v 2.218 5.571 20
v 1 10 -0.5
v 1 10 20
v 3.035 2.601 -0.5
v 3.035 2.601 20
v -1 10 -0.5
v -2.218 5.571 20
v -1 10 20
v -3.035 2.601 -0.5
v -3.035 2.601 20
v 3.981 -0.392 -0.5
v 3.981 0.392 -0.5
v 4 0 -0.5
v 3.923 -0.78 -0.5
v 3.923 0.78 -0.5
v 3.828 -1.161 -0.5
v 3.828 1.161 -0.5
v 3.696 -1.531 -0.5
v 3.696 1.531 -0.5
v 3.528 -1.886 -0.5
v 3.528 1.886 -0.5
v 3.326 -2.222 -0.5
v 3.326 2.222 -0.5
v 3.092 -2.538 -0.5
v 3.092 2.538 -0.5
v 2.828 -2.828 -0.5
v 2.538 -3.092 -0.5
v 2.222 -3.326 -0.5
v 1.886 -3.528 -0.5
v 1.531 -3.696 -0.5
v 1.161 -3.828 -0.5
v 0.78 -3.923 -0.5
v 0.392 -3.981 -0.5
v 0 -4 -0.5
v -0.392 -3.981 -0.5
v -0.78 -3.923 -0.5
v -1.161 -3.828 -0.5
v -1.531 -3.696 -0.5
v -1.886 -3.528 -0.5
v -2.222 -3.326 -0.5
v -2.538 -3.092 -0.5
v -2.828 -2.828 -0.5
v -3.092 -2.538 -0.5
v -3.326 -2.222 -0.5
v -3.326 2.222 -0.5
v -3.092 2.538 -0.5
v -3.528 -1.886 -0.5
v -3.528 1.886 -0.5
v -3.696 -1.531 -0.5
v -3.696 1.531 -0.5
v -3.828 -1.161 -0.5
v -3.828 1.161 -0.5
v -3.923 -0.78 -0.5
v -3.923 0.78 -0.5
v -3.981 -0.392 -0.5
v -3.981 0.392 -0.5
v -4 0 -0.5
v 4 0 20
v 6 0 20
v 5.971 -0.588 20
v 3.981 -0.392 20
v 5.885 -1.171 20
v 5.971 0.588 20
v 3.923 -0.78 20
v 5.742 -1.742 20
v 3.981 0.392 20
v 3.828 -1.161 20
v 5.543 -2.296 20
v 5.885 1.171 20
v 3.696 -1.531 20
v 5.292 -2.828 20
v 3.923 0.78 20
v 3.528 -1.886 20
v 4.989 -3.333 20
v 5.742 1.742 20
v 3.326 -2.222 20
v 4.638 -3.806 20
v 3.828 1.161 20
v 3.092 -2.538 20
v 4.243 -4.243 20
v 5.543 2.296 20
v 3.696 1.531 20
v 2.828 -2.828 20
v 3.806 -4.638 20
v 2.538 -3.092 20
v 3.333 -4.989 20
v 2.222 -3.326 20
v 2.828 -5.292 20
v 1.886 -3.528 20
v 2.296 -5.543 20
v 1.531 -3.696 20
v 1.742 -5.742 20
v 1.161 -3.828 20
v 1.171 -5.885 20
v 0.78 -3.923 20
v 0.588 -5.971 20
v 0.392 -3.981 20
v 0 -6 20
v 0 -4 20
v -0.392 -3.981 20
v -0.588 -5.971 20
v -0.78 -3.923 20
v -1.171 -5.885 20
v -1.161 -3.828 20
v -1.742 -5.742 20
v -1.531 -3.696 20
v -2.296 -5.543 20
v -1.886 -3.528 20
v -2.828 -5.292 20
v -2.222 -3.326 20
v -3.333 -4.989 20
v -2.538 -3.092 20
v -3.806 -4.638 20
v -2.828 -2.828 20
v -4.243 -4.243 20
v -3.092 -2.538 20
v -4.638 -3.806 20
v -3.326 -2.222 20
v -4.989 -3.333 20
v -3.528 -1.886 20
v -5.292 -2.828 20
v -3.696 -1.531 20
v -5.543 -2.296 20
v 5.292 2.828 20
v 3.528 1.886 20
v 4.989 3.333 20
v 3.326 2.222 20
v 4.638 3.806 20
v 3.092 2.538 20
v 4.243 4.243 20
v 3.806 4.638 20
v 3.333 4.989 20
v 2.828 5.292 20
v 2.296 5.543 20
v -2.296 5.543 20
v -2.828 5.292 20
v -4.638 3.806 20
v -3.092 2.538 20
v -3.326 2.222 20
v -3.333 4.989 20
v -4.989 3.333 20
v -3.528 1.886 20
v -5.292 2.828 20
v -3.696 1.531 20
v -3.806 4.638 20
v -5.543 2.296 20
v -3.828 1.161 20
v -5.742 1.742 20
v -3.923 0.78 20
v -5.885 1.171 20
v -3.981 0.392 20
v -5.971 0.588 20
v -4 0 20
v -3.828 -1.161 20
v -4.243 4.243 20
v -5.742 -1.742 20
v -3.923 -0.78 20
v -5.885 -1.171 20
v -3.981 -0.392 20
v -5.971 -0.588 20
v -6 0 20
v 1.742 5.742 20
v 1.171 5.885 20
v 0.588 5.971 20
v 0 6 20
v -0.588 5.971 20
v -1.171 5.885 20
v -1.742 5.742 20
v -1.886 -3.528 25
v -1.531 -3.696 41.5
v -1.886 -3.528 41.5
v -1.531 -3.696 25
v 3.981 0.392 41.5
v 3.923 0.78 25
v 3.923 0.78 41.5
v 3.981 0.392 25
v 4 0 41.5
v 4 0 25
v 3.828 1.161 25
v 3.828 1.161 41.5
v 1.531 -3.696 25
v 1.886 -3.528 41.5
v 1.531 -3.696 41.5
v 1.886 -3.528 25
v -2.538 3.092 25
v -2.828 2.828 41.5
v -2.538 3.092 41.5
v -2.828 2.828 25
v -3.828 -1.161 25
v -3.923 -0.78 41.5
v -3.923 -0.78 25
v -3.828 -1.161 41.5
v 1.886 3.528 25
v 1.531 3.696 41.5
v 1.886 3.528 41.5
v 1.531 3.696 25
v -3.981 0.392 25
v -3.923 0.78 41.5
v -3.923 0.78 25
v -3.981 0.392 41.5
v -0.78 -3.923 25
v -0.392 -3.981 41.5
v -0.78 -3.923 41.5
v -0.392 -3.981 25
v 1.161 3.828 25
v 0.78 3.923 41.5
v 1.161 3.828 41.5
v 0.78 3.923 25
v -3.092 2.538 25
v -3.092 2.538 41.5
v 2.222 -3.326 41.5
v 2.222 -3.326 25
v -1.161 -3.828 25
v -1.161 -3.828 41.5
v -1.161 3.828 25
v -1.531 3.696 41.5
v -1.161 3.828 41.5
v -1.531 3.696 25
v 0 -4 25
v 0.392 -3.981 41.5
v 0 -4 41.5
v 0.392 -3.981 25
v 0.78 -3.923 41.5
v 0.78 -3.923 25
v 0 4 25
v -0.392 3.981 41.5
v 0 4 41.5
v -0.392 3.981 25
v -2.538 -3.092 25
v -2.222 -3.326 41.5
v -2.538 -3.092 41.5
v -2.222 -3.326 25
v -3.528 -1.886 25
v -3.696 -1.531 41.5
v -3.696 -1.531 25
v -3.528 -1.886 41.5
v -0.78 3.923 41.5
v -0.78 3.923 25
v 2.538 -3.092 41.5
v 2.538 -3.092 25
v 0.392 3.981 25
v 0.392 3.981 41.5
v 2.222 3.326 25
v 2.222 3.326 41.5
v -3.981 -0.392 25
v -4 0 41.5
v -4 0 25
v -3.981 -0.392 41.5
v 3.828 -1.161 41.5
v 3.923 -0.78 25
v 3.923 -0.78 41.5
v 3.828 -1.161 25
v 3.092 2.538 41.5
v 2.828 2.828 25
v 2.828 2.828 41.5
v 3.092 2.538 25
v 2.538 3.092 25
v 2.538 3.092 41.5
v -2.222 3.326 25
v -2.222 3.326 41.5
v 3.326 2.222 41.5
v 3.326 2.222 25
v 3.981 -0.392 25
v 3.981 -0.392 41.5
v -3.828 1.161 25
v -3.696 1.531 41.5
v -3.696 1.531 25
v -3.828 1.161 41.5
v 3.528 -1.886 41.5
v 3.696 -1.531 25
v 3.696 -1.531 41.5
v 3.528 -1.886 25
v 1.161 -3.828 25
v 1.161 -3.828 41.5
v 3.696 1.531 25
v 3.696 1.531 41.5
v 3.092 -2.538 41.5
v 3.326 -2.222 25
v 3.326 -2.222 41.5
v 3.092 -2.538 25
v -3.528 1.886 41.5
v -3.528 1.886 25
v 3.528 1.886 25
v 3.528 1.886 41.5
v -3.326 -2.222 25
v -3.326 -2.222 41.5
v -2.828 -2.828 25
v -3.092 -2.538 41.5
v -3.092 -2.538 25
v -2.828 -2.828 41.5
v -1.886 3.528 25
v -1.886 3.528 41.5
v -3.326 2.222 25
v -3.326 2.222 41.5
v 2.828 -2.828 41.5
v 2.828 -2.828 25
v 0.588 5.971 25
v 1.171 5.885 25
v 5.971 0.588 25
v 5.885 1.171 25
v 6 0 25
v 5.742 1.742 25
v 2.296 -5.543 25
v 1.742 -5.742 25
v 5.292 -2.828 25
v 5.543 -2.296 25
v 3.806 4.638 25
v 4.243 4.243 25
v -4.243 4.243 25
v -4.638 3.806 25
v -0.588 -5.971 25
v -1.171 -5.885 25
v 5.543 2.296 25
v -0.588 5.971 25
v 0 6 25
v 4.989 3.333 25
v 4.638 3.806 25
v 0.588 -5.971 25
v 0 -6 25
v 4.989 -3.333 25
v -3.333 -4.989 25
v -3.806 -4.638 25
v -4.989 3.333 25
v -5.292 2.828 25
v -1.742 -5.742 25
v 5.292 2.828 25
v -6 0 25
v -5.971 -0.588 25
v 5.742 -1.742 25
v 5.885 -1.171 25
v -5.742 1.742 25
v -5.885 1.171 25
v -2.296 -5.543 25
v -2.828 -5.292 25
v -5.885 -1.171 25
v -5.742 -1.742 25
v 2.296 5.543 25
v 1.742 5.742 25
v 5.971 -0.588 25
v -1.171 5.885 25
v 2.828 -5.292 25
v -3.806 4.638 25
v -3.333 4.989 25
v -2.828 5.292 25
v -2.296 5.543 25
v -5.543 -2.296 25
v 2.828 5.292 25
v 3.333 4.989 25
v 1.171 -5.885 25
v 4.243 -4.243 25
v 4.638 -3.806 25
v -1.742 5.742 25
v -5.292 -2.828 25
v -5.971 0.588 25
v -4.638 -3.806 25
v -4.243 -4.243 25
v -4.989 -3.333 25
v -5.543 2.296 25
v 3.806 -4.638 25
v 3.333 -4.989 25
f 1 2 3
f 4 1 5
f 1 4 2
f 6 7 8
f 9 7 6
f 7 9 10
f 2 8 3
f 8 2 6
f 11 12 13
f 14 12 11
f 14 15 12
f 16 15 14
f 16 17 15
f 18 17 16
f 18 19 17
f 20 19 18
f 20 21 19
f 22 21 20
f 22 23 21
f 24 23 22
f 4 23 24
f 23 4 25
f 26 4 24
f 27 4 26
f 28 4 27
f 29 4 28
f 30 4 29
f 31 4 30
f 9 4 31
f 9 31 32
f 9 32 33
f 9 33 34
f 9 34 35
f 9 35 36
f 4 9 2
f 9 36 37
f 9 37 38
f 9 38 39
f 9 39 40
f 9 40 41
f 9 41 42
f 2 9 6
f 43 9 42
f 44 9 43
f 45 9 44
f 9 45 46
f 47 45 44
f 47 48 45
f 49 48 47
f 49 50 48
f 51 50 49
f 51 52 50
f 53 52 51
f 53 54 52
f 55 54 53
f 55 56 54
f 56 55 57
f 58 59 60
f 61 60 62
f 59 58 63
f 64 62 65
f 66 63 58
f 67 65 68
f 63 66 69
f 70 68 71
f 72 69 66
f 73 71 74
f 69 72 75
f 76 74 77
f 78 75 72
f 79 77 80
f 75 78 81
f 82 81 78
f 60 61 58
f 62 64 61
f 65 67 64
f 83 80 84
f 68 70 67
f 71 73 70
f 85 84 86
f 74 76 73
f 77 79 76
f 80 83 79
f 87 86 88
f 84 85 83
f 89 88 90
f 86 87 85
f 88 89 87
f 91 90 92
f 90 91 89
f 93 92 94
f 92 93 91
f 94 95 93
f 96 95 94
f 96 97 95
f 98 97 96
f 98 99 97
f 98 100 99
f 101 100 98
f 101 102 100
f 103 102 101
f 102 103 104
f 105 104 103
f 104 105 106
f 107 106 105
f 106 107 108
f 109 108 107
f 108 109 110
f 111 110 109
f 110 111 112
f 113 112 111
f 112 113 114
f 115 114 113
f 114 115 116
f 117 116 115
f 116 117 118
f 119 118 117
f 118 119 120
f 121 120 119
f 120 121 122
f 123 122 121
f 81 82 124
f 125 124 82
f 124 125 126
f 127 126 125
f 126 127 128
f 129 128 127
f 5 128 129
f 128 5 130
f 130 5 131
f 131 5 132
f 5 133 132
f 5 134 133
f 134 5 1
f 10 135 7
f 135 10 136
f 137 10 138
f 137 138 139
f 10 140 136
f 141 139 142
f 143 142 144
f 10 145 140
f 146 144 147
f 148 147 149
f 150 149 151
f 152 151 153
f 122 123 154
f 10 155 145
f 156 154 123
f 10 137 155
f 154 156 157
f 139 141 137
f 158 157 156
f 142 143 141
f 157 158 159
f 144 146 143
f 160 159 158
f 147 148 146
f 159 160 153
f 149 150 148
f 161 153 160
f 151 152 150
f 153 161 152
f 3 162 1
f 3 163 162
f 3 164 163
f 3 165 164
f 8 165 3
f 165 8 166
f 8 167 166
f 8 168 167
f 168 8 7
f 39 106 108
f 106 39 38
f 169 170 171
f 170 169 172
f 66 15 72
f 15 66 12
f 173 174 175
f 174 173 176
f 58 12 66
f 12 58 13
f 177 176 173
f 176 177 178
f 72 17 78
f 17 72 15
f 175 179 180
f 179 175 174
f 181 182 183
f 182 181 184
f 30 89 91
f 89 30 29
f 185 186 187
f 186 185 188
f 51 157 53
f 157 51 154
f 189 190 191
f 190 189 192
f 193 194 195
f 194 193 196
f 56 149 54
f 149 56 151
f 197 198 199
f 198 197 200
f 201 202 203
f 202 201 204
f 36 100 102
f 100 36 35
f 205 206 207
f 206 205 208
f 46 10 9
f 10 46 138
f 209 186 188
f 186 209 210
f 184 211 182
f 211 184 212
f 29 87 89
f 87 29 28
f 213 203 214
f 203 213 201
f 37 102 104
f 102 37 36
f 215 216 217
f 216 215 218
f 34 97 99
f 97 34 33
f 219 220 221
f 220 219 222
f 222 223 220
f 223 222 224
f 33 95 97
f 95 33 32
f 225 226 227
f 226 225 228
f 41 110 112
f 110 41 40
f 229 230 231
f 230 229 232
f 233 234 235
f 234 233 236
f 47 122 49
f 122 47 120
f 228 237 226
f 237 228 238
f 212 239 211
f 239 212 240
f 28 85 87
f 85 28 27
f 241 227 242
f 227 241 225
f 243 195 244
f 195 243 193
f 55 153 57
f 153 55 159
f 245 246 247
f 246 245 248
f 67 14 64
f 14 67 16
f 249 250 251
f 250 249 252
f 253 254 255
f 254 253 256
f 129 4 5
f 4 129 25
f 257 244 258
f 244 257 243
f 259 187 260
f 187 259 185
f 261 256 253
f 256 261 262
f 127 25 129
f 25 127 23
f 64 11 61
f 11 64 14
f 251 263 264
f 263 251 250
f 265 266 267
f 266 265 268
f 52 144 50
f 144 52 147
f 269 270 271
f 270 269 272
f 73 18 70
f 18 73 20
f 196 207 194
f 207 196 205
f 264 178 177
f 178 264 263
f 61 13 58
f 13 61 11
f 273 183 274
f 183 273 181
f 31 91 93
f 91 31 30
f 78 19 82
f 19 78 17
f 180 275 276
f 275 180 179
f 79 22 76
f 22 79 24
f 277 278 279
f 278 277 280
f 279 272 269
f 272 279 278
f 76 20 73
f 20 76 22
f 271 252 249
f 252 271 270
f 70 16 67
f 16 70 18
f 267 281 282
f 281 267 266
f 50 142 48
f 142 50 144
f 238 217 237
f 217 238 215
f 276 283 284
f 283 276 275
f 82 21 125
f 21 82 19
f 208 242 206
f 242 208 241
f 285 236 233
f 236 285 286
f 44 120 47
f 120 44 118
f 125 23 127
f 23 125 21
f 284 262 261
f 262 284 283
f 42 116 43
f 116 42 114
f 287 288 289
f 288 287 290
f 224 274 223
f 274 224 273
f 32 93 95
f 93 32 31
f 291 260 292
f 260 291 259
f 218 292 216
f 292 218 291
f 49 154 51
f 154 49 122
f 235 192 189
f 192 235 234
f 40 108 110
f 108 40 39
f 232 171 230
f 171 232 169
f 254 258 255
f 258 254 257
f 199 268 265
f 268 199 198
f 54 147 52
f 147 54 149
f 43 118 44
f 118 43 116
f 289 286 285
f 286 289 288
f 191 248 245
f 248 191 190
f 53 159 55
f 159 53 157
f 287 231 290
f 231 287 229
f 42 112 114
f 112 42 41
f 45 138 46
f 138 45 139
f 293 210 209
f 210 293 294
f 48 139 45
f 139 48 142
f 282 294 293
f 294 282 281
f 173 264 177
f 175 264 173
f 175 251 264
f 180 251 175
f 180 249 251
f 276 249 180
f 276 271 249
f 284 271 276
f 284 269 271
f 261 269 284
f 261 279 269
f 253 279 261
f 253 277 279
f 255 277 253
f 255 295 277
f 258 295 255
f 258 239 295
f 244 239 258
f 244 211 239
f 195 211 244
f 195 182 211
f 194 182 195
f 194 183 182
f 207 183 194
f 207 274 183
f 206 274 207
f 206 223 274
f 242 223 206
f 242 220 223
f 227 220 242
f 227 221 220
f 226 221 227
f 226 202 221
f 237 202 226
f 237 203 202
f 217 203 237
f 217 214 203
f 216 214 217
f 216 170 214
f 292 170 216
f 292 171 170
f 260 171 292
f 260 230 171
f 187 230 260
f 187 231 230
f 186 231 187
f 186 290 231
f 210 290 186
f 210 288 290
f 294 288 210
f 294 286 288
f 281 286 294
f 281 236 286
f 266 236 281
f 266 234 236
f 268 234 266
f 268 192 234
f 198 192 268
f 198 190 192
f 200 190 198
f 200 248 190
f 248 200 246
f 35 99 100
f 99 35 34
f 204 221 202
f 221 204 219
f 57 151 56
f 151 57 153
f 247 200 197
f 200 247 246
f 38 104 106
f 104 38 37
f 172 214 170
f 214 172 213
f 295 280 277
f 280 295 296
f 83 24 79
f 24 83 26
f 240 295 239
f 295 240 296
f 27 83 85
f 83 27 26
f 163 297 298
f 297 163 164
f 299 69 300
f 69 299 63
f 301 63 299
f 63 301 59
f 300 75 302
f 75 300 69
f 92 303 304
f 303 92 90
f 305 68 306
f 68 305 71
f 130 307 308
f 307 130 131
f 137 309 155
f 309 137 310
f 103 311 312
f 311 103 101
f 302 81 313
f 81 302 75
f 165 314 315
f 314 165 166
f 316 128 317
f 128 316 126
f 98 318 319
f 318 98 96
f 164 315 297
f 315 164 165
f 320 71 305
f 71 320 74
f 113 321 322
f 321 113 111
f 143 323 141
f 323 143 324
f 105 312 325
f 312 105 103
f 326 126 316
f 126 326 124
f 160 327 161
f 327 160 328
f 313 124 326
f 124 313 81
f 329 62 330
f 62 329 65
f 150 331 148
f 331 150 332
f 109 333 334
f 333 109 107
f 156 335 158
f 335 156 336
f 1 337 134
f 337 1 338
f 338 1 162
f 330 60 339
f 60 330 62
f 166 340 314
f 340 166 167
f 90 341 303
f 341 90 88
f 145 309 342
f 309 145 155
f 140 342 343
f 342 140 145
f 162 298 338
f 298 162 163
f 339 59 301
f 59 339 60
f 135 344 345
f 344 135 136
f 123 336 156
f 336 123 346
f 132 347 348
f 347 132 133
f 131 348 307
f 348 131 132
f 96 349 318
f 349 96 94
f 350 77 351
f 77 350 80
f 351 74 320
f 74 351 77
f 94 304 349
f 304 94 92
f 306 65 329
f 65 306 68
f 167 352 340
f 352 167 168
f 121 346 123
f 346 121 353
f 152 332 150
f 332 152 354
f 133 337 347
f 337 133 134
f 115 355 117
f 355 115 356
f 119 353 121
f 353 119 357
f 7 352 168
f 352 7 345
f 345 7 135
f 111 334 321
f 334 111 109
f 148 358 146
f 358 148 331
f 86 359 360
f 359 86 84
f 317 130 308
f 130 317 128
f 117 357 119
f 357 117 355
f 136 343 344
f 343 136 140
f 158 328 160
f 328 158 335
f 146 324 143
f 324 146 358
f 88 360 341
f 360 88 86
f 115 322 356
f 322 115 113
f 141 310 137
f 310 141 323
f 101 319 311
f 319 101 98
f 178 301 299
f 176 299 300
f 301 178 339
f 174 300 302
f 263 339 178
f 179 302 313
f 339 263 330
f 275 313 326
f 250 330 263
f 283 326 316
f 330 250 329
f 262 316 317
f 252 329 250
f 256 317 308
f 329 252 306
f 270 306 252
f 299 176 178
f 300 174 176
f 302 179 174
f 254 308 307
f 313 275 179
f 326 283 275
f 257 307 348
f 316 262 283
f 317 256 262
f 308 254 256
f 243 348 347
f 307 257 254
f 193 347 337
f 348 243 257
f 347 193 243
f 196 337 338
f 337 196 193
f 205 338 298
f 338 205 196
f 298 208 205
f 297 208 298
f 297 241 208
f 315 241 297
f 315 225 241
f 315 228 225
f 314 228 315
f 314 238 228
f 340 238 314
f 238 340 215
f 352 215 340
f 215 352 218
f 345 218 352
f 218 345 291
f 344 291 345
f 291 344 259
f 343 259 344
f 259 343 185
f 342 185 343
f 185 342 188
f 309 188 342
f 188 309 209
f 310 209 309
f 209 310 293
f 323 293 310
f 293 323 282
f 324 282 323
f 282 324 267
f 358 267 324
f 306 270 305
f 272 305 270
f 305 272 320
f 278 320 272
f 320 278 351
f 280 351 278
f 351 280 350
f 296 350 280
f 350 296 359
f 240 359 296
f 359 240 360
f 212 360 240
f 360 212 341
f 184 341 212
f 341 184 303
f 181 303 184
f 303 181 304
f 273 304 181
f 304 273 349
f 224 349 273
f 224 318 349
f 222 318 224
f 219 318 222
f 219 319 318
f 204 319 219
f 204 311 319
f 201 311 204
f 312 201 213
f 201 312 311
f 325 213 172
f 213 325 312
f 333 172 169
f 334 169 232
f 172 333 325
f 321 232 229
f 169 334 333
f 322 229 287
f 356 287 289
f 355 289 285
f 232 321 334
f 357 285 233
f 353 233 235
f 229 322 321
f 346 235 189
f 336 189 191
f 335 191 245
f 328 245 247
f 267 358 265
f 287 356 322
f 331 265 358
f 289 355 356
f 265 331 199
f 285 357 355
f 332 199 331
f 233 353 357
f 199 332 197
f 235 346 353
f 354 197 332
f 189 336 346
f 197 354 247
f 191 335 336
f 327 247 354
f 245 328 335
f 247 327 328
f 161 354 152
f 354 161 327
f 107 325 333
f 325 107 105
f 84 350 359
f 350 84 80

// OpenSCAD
// Straight hose-barb reducer: 8 mm tubing -> 5 mm tubing
// Print orientation: standing upright along +Z, centred on origin in X/Y

$fn = 64;

// ---- Dimensions (mm) ----
reducer_id     = 8;    // 8 mm tubing inner diameter (bore)
reducer_od     = 5;    // 5 mm tubing inner diameter (bore)
barb_h_8       = 10;   // height of each 8 mm barb
barb_od_8_bot  = 7.5;  // outer diameter of 8 mm barb at bottom
barb_od_8_top  = 9.5;  // outer diameter of 8 mm barb at top
barb_h_5       = 8;    // height of each 5 mm barb
barb_od_5_bot  = 6.5;  // outer diameter of 5 mm barb at bottom
barb_od_5_top  = 5.0;  // outer diameter of 5 mm barb at top
collar_h       = 5;    // height of cylindrical collar (z = 20 to 25)
barb_start_z   = 25;   // z where 5 mm barbs begin
overlap        = 0.5;  // overlap between stacked barbs for a clean union

// ---- Derived ----
reducer_len    = 41;   // overall length (z = 0 to 41)
eps            = 0.5;  // cutter overshoot past faces

// ---- Model ----
union() {
    // Bore through full length
    translate([0, 0, -eps])
        cylinder(h = reducer_len + 2 * eps, d = reducer_id);

    // 8 mm barbs: z = 0 to 20
    for (i = [0 : 1])
        translate([0, 0, i * barb_h_8 - overlap])
            linear_extrude(height = barb_h_8 + overlap)
                polygon([
                    [-barb_od_8_bot / 2, 0],
                    [ barb_od_8_bot / 2, 0],
                    [ (barb_od_8_top - barb_od_8_bot) / 2, barb_h_8],
                    [ -(barb_od_8_top - barb_od_8_bot) / 2, barb_h_8]
                ]);

    // Collar: z = 20 to 25
    translate([0, 0, 20])
        cylinder(h = collar_h, d = 12);

    // 5 mm barbs: z = 25 to 33
    for (i = [0 : 1])
        translate([0, 0, barb_start_z + i * barb_h_5 - overlap])
            linear_extrude(height = barb_h_5 + overlap)
                polygon([
                    [-barb_od_5_bot / 2, 0],
                    [ barb_od_5_bot / 2, 0],
                    [ (barb_od_5_top - barb_od_5_bot) / 2, barb_h_5],
                    [ -(barb_od_5_top - barb_od_5_bot) / 2, barb_h_5]
                ]);
}
